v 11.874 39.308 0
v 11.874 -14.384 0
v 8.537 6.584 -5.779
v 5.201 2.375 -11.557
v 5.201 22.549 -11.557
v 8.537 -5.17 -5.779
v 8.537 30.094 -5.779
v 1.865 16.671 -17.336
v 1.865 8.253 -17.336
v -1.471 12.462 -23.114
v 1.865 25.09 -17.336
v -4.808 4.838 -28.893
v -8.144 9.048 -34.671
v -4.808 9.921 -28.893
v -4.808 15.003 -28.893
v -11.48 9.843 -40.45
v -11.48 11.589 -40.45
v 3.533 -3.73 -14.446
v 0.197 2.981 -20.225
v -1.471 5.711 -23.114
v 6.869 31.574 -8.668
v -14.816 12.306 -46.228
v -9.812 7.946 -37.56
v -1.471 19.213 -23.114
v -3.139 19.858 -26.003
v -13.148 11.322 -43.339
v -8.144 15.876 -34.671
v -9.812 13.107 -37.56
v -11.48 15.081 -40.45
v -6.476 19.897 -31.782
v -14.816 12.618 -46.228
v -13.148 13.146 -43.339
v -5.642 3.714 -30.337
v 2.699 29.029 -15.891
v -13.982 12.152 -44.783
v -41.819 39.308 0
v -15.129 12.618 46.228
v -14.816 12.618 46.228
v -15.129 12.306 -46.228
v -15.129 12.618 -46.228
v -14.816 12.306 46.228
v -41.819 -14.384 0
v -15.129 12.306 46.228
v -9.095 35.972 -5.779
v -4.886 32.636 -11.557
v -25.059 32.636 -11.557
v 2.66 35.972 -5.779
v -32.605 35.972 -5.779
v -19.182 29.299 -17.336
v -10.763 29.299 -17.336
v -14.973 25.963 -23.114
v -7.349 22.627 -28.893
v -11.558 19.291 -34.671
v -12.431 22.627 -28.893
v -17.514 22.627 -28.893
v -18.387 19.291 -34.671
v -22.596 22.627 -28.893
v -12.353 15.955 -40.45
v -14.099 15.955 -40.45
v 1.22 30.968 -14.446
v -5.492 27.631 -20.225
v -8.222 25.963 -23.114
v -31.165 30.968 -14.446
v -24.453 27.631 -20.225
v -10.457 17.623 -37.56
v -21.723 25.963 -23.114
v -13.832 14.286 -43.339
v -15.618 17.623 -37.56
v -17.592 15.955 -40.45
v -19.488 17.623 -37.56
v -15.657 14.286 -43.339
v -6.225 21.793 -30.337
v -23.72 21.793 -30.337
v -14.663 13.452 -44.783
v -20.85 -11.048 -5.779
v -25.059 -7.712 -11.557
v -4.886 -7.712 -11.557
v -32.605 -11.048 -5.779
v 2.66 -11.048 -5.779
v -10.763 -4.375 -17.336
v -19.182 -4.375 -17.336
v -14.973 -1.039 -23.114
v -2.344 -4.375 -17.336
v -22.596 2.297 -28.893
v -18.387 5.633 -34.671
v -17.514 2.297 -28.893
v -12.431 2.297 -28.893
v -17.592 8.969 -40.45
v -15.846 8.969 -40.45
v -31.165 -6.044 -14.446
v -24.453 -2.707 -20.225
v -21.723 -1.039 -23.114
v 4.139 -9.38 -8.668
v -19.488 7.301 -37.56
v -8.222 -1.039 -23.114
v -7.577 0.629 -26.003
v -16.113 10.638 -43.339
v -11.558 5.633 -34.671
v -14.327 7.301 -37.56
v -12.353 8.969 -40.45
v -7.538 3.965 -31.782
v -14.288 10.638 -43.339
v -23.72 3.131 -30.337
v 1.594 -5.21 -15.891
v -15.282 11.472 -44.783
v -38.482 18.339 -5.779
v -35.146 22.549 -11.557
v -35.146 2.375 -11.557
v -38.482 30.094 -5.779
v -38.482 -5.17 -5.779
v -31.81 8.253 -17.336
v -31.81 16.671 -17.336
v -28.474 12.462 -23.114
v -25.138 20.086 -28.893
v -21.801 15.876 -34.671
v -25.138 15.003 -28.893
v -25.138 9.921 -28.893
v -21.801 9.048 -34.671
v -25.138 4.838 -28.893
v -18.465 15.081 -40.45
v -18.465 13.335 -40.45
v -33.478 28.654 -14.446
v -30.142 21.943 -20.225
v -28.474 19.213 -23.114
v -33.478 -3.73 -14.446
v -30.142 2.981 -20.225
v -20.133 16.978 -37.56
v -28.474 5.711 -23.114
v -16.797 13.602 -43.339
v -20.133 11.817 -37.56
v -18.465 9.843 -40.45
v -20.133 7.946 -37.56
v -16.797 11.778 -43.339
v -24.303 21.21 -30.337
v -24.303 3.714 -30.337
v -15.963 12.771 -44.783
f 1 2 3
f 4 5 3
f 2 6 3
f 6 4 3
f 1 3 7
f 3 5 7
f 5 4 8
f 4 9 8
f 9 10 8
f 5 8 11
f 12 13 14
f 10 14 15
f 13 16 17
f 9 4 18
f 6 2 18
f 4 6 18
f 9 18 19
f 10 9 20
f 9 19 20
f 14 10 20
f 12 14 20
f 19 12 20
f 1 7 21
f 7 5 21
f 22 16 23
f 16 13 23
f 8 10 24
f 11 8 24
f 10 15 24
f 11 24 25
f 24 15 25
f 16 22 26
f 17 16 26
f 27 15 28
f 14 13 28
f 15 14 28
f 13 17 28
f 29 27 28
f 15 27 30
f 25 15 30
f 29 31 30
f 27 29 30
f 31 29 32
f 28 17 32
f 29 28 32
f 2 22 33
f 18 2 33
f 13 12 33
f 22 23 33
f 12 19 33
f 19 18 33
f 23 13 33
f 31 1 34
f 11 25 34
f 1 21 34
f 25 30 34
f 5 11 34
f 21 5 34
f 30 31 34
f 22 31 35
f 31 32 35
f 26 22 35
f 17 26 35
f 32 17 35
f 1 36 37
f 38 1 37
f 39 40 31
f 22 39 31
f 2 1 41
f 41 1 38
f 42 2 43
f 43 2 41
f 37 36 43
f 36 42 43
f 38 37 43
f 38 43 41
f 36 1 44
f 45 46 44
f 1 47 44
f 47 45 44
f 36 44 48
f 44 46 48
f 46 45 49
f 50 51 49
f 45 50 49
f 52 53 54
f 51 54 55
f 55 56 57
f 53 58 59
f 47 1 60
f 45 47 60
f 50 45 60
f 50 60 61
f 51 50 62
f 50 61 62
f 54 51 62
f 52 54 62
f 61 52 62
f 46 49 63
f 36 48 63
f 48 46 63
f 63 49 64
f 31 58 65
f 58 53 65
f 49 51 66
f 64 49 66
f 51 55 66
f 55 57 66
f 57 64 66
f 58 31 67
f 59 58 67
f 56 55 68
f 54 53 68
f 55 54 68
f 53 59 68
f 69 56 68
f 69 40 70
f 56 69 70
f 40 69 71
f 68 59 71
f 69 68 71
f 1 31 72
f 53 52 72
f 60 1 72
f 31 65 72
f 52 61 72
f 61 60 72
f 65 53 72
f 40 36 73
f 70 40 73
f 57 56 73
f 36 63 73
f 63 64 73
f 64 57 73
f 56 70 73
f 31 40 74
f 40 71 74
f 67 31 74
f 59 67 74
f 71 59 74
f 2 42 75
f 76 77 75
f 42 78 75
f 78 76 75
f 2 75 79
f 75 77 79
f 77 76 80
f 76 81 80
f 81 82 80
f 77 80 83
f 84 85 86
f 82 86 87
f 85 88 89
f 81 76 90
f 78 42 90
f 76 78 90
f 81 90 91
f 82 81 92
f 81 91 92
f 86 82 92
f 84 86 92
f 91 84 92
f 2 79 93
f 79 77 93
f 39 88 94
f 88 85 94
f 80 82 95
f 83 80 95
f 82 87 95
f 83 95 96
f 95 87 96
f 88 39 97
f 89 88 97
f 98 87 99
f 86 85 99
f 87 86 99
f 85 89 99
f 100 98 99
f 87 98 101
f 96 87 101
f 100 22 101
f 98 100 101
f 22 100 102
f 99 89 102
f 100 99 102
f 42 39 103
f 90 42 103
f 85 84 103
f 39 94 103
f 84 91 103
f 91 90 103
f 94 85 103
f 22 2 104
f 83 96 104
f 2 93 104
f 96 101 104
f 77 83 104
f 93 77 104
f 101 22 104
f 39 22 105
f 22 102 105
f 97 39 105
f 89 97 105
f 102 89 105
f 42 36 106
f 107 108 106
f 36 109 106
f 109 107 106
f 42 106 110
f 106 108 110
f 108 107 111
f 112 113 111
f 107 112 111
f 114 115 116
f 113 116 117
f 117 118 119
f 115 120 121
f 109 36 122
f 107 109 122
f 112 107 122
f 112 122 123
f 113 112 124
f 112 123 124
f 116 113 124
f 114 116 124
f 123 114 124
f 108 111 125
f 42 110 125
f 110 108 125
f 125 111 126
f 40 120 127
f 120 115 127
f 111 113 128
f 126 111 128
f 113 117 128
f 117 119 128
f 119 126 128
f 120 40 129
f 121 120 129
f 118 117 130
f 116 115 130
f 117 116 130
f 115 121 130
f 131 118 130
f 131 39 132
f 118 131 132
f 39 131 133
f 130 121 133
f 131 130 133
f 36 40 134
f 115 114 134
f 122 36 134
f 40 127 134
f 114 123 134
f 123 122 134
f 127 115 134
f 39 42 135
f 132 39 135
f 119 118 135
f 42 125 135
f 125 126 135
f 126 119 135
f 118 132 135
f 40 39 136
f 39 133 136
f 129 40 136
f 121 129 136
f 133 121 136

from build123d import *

# Parameters (mm, degrees)
F0_W          = 53.6921843886
F0_H          = 53.6921843886
F1_DEPTH      = 46.228
F1_TAPER      = 30
F1_DEPTH_BACK = 46.228
F1_TAPER_BACK = 30


with BuildPart() as f1:
    # F0 (on Top) → F1 (new body, two sides)
    with BuildSketch(Plane.XY) as f1_sk:
        with Locations((-14.9725442752, 12.4619603157)):
            Rectangle(F0_W, F0_H)
    extrude(amount=F1_DEPTH, taper=F1_TAPER)
    extrude(f1_sk.sketch, amount=-F1_DEPTH_BACK, taper=F1_TAPER_BACK)


solid = f1.part
